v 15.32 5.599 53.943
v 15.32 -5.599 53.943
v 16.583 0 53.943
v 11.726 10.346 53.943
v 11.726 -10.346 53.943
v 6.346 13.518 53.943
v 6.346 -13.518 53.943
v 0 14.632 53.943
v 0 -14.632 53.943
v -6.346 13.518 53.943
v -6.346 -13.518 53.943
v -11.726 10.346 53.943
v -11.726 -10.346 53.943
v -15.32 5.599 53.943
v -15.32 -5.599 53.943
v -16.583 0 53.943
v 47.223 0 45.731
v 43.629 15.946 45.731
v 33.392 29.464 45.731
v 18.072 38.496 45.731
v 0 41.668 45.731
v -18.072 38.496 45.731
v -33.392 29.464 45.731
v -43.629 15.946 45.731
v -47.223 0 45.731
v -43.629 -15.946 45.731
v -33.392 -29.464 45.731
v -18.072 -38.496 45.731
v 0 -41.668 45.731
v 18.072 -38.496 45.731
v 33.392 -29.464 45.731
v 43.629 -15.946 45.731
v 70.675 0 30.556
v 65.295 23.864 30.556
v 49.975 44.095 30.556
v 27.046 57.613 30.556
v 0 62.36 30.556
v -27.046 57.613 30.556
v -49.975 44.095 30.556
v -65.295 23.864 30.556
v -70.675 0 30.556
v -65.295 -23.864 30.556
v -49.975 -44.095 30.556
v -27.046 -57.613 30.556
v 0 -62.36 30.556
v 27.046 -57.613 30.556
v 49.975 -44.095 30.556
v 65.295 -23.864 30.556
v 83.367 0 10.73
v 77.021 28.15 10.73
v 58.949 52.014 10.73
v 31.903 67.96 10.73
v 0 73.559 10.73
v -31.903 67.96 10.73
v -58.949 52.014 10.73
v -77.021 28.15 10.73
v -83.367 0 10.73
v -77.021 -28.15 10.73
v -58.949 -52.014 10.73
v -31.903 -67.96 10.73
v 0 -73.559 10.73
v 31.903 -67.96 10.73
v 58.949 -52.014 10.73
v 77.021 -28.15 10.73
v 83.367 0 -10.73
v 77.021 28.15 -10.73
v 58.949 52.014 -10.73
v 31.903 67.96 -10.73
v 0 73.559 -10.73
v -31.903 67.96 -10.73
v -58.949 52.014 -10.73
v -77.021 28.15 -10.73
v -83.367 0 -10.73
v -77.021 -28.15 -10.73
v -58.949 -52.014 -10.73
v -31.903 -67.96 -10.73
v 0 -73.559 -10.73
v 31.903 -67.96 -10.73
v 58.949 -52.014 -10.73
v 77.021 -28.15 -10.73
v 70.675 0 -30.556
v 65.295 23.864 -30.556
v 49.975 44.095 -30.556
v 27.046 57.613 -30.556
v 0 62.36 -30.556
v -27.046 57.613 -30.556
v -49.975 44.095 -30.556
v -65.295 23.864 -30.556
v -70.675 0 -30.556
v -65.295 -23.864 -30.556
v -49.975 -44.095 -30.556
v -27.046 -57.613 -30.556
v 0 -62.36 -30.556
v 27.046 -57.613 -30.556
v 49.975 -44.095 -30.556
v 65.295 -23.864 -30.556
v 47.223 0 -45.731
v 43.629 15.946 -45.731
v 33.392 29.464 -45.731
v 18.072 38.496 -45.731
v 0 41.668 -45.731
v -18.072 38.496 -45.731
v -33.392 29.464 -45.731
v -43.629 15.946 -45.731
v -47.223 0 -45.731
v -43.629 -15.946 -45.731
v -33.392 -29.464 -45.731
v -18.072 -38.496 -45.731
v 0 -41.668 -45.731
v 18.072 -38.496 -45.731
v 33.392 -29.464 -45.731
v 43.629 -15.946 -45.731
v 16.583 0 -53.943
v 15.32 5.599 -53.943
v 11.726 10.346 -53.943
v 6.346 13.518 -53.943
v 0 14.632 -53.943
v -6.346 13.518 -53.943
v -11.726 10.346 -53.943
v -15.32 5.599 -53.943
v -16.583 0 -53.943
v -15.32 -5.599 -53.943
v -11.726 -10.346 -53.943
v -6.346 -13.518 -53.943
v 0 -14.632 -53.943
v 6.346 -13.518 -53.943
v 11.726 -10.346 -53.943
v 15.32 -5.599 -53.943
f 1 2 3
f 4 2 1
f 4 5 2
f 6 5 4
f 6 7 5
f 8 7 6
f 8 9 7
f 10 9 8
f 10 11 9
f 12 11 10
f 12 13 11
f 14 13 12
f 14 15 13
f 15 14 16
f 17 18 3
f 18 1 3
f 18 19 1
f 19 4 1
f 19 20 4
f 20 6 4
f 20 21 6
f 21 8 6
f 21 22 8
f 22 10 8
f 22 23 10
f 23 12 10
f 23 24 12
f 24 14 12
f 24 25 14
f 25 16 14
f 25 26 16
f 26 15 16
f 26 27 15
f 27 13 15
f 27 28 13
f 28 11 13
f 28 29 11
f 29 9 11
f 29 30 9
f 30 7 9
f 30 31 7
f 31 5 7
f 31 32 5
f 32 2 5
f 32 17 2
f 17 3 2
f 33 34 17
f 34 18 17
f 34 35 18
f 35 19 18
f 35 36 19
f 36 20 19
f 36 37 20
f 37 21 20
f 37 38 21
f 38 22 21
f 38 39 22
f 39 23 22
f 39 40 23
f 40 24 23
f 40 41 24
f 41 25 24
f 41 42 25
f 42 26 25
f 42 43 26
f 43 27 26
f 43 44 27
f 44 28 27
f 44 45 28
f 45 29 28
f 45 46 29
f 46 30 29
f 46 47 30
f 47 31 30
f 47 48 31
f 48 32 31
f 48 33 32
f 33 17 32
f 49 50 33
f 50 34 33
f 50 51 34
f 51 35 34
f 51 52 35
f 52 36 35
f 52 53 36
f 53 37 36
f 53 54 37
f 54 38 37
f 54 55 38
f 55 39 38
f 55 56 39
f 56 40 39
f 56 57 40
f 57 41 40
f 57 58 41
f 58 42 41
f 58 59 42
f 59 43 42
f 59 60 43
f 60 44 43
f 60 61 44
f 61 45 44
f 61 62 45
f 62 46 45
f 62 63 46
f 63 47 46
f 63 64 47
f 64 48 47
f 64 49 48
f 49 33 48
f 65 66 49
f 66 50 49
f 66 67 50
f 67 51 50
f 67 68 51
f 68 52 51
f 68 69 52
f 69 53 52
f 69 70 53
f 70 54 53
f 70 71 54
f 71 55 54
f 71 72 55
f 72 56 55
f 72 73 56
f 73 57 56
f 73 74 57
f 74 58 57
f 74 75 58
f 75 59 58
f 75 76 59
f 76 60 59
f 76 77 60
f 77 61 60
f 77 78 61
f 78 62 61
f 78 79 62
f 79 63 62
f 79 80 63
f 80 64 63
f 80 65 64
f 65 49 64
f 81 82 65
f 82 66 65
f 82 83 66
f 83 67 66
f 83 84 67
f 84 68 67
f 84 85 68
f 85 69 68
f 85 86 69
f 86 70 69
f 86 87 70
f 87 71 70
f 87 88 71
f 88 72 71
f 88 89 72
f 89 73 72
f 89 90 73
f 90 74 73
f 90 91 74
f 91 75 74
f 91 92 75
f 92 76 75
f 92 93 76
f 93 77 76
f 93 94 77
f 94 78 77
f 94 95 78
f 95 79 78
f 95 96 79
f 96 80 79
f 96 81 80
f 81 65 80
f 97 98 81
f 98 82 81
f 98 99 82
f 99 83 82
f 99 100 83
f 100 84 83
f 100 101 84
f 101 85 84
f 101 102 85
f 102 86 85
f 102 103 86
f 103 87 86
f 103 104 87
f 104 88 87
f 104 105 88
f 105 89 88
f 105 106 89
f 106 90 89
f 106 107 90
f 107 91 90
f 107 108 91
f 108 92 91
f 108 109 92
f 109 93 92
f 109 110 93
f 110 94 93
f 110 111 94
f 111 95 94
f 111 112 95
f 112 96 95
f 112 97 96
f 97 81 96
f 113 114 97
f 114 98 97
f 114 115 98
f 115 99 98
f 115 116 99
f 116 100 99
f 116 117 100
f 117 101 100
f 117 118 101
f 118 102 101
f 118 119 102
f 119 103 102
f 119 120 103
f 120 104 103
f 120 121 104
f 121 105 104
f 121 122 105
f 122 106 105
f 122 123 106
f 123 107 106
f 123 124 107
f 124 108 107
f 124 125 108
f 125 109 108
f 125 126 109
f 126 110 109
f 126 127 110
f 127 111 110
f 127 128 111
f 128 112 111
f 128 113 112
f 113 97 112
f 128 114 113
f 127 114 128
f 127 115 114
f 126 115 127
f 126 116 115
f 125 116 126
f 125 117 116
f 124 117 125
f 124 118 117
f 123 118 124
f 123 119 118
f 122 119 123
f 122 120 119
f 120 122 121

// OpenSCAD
// Generated by SolidPython 1.0.1 on 2020-07-29 00:46:53


scale(v = [17, 15, 11]) {
	sphere(r = 5);
}
/***********************************************
*********      SolidPython code:      **********
************************************************
 
# import packages: SolidPython
from solid import *
from solid.utils import *
from itertools import chain, combinations, permutations


class Resize:

    def __init__(self, scad_file):
        self.scad_file = scad_file
        #self.scad_file = import_scad(scad_file)
        # cone/cylinder param:
        self.r1 = 0
        self.r2 = 0
        self.h = 0
        # rectangular prism param:
        self.w = 0
        self.l = 0
        # ellipse param:
        self.r = 0

    # import OpenScad code (file name corresponds to shape)


    # classify shape + parameters
    def assign(self, param1, param2, param3):
        if self.scad_file == 'cone.scad':
            self.r1 = param1
            self.r2 = param2
            self.h = param3
        elif self.scad_file == 'cylinder.scad':
            self.r1 = param1
            self.r2 = param2
            self.h = param3
        elif self.scad_file == 'rectangularPrism.scad':
            self.h = param1
            self.l = param2
            self.w = param3
        else:
            self.r = param1
            self.h = param2

    # resize parameters
    def iterate(self):
        x = range(3, 20, 2)
        i = 1
        if self.scad_file == 'cone.scad':
            tempList = list(permutations(x, 2))
            for temp in tempList:
                param1 = temp[0]
                param2 = temp[1]
                filepath = 'produced_scad_files/' + 'cone' + str(param1) + '_' + str(param2) + '_' + '.scad'
                scad_render_to_file(cylinder(h=param1, r1=param2, r2=0), filepath)

        elif self.scad_file == 'cylinder.scad':
            tempList = list(permutations(x, 3))
            for temp in tempList:
                param1 = temp[0]
                param2 = temp[1]
                filepath = 'produced_scad_files/' + 'cylinder' + str(param1) + '_' + str(param2) + '_' + '.scad'
                scad_render_to_file(cylinder(h=param1, r1=param2, r2=param2), filepath)

        elif self.scad_file == 'rectangularPrism.scad':
            tempList = list(permutations(x, 3))
            for temp in tempList:
                param1 = temp[0]
                param2 = temp[1]
                param3 = temp[2]
                filepath = 'produced_scad_files/' + 'rectangularPrism' + str(param1) + '_' + str(param2) + '_' + str(
                    param3) + '.scad'
                scad_render_to_file(cube(size=(param1, param2, param3)), filepath)

        elif self.scad_file == 'ellipse.scad':
            tempList = list(permutations(x, 4))
            for temp in tempList:
                param1 = temp[0]
                param2 = temp[1]
                param3 = temp[2]
                param4 = temp[3]
                filepath = 'produced_scad_files/' + 'ellipse' + str(param1) + '_' + str(param2) + '_' + str(param3) + '_' + str(param4) + '.scad'
                scad_render_to_file(scale([param1, param2, param3])(sphere(r=param4)), filepath)

    def render_to_scadfile(self):
        scad_render_to_file(scad, 'example.scad') 
 
************************************************/
